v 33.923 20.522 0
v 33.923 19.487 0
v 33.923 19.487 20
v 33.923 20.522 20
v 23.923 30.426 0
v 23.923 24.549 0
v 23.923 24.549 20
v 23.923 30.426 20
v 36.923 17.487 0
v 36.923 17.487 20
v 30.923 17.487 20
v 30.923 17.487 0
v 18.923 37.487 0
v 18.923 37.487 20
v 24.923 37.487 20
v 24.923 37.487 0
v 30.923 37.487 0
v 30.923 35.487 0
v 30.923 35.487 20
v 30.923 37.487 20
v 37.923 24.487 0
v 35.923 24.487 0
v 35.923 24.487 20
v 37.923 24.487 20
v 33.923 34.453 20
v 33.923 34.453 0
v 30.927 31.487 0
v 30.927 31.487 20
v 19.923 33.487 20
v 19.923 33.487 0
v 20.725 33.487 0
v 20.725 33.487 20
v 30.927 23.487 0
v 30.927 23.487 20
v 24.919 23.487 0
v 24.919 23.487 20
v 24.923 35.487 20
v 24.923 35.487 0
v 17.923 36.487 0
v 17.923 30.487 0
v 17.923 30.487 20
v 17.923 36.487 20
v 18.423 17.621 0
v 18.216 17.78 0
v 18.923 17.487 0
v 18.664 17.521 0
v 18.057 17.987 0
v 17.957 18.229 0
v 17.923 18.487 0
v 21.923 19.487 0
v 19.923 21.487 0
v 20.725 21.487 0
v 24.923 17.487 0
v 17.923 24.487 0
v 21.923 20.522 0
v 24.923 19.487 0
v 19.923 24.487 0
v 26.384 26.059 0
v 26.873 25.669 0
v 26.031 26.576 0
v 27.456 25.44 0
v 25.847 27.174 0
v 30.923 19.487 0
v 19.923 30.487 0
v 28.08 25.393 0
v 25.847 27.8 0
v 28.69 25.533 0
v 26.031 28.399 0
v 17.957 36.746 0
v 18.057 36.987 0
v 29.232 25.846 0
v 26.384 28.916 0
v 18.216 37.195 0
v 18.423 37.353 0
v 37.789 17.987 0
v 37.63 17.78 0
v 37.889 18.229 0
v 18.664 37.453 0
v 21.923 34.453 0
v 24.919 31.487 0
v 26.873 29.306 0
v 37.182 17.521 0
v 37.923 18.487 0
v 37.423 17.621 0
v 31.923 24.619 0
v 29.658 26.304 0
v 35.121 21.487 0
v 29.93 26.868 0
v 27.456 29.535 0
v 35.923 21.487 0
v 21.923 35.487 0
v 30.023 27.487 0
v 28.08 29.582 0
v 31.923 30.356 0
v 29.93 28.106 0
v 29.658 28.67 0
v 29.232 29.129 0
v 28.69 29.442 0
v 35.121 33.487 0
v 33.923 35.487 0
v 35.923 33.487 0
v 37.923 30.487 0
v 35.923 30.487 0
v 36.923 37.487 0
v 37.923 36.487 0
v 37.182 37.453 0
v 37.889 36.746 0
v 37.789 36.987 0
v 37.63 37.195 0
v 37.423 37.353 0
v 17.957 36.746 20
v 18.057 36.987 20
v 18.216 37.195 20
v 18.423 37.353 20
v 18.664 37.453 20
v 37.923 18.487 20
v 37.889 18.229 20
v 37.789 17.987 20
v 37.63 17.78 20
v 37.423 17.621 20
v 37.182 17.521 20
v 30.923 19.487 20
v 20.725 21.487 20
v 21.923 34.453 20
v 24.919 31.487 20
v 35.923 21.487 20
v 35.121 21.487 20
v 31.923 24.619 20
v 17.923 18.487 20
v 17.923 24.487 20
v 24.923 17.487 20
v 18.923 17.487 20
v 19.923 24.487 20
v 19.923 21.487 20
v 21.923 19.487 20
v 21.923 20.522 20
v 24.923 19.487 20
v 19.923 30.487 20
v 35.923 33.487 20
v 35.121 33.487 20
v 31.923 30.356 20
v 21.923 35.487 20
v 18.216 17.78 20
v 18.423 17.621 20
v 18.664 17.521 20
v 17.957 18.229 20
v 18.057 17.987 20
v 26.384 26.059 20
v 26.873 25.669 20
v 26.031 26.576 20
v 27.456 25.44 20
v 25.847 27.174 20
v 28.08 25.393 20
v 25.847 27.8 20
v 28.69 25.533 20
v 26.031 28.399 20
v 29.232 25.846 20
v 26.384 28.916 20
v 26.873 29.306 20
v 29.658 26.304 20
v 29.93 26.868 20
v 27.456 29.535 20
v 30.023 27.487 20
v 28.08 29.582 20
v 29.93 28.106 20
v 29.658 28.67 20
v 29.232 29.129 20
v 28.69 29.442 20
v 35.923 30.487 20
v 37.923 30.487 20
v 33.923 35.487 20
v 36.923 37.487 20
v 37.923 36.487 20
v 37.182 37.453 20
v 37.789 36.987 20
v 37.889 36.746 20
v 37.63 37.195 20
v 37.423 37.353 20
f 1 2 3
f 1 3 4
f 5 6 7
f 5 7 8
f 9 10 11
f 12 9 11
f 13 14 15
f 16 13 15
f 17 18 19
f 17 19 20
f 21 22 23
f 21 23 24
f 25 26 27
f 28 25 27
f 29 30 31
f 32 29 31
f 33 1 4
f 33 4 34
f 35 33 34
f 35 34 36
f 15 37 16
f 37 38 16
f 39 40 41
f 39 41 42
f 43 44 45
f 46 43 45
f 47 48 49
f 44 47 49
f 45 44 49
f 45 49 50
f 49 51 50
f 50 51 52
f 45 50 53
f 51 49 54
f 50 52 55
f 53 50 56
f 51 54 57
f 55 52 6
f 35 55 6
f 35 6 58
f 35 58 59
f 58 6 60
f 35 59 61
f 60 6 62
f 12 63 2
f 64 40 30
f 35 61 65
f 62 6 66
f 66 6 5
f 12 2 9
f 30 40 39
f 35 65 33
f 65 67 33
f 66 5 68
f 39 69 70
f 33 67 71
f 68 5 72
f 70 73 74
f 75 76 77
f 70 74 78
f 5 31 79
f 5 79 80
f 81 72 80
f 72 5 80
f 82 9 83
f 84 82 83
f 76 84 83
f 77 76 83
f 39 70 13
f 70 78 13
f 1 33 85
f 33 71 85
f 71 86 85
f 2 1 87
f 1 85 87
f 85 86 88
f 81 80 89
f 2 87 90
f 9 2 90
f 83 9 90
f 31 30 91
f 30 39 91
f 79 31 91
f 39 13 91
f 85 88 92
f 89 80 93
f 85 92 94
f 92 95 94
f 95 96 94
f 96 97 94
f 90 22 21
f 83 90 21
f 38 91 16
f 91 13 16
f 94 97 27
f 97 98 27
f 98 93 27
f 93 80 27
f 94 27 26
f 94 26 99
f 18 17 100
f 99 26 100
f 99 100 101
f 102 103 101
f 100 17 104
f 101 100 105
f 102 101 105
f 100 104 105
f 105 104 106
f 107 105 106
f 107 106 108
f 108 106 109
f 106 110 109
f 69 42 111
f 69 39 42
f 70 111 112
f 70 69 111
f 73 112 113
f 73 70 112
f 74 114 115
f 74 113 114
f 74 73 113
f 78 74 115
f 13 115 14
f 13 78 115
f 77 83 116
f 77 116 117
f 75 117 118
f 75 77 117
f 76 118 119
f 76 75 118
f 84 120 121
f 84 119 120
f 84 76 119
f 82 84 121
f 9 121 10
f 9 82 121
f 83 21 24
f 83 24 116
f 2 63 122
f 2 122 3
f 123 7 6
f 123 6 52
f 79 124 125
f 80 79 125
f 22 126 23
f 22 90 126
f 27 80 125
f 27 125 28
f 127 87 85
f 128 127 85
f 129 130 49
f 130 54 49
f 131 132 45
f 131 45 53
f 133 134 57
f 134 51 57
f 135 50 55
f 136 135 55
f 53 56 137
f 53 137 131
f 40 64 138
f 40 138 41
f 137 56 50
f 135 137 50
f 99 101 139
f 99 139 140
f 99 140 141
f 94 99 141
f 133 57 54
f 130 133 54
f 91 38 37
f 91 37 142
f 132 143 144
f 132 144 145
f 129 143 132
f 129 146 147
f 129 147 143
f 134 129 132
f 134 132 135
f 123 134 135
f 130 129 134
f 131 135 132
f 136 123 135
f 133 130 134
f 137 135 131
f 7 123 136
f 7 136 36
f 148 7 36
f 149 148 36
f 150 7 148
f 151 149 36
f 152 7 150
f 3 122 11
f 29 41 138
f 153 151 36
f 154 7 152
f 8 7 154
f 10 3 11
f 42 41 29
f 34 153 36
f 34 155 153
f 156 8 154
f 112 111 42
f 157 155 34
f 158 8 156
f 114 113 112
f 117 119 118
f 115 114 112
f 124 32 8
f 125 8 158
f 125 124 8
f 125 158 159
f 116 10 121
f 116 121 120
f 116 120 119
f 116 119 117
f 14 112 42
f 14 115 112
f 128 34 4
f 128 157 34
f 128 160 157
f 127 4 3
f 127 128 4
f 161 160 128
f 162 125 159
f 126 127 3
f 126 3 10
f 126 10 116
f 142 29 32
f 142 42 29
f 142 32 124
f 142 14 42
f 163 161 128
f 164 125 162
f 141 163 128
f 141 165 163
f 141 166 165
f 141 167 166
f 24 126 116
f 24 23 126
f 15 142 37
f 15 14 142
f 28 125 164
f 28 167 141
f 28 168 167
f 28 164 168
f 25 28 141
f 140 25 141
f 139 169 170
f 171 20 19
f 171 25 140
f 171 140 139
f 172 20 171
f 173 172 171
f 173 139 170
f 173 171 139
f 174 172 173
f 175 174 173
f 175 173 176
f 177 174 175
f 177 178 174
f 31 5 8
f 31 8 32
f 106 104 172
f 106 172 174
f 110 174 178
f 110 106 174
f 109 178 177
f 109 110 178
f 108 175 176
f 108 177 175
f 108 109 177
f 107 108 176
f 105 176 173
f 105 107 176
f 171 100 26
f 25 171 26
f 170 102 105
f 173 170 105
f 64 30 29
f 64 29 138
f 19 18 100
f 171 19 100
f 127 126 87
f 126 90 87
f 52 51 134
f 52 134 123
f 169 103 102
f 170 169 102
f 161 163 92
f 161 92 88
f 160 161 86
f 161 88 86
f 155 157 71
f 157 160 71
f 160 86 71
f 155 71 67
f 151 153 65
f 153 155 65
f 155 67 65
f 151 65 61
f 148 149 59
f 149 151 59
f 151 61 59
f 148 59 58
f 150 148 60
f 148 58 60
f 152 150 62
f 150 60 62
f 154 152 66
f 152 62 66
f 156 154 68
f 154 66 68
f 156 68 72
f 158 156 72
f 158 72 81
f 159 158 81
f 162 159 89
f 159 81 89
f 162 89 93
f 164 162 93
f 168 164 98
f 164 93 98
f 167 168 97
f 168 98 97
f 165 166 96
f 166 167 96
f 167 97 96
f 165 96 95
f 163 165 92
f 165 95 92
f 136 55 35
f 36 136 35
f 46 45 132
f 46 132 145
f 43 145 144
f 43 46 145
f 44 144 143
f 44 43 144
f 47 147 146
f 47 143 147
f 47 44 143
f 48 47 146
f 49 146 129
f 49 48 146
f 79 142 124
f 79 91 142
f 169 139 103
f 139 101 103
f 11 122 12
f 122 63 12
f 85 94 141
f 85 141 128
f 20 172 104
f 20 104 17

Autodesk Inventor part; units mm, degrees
ref_plane "YZ Plane" through (0, 0, 0) normal (1, 0, 0) x (0, 1, 0)
ref_plane "XZ Plane" through (0, 0, 0) normal (0, 1, 0) x (-1, 0, 0)
ref_plane "XY Plane" through (0, 0, 0) normal (0, 0, 1) x (1, 0, 0)
sketch "Schizzo1" plane through (0, 0, 0) normal (0, 0, 1) x (1, 0, 0)
  arc A0 (36.9231, 17.4874) -> (37.9231, 18.4874) centre (36.9231, 18.4874) ccw
  line L0 (27.9231, 37.356) -> (27.9231, 17.6188) construction
  line L1 (36.9231, 17.4874) -> (30.9231, 17.4874)
  line L2 (30.9231, 19.4874) -> (33.9231, 19.4874)
  line L3 (30.9231, 19.4874) -> (30.9231, 17.4874)
  line L4 (33.9231, 19.4874) -> (33.9231, 20.5217)
  line L5 (35.9231, 21.4874) -> (35.1213, 21.4874)
  line L6 (33.9231, 20.5217) -> (30.9273, 23.4874)
  line L7 (31.958, 23.6188) -> (32.4267, 23.6188) construction
  line L8 (35.1213, 21.4874) -> (31.9231, 24.6188)
  line L9 (27.9231, 28.7445) -> (27.9203, 28.7473)
  line L10 (27.9231, 27.4874) -> (16.785, 27.4874) construction
  line L11 (35.9231, 21.4874) -> (35.9231, 24.4874)
  line L12 (35.9231, 24.4874) -> (37.9231, 24.4874)
  line L13 (37.9231, 24.4874) -> (37.9231, 18.4874)
  line L14 (0.5417, 54.5893) -> (0.5417, -0.7152) construction
  arc A1 (17.9231, 18.4874) -> (18.9231, 17.4874) centre (18.9231, 18.4874) ccw
  line L15 (18.9231, 17.4874) -> (24.9231, 17.4874)
  line L16 (24.9231, 19.4874) -> (21.9231, 19.4874)
  line L17 (24.9231, 19.4874) -> (24.9231, 17.4874)
  line L18 (21.9231, 19.4874) -> (21.9231, 20.5217)
  line L19 (19.9231, 21.4874) -> (20.725, 21.4874)
  line L20 (21.9231, 20.5217) -> (24.919, 23.4874)
  line L21 (23.958, 23.6188) -> (23.9231, 23.6188) construction
  line L22 (19.9231, 21.4874) -> (19.9231, 24.4874)
  line L23 (19.9231, 24.4874) -> (17.9231, 24.4874)
  line L24 (17.9231, 24.4874) -> (17.9231, 18.4874)
  line L25 (33.8225, 24.3529) -> (33.8225, 24.4874)
  arc A2 (37.9231, 36.4874) -> (36.9231, 37.4874) centre (36.9231, 36.4874) ccw
  line L26 (36.9231, 37.4874) -> (30.9231, 37.4874)
  line L27 (30.9231, 35.4874) -> (33.9231, 35.4874)
  line L28 (30.9231, 35.4874) -> (30.9231, 37.4874)
  line L29 (33.9231, 35.4874) -> (33.9231, 34.4531)
  line L30 (35.9231, 33.4874) -> (35.1213, 33.4874)
  line L31 (33.9231, 34.4531) -> (30.9273, 31.4874)
  line L32 (31.958, 31.356) -> (32.4267, 31.356) construction
  line L33 (35.1213, 33.4874) -> (31.9231, 30.356)
  line L34 (35.9231, 33.4874) -> (35.9231, 30.4874)
  line L35 (35.9231, 30.4874) -> (37.9231, 30.4874)
  line L36 (37.9231, 30.4874) -> (37.9231, 36.4874)
  arc A3 (18.9231, 37.4874) -> (17.9231, 36.4874) centre (18.9231, 36.4874) ccw
  line L37 (19.9231, 30.4874) -> (17.9231, 30.4874)
  line L38 (19.9231, 33.4874) -> (20.725, 33.4874)
  line L39 (19.9231, 33.4874) -> (19.9231, 30.4874)
  line L40 (21.9231, 34.4531) -> (24.919, 31.4874)
  line L41 (24.9231, 35.4874) -> (21.9231, 35.4874)
  line L42 (21.9231, 35.4874) -> (21.9231, 34.4531)
  line L43 (24.9231, 35.4874) -> (24.9231, 37.4874)
  line L44 (18.9231, 37.4874) -> (24.9231, 37.4874)
  line L45 (17.9231, 30.4874) -> (17.9231, 36.4874)
  line L46 (33.8225, 30.6219) -> (33.8225, 30.4874)
  line L47 (30.9273, 23.4874) -> (24.919, 23.4874)
  line L48 (23.9231, 24.549) -> (23.9231, 30.4259)
  line L49 (24.919, 31.4874) -> (30.9273, 31.4874)
  line L50 (31.9231, 30.356) -> (31.9231, 24.6188)
  line L51 (23.9231, 24.549) -> (20.725, 21.4874)
  line L52 (23.9231, 30.4259) -> (20.725, 33.4874)
  circle A4 centre (27.9231, 27.4874) radius 2.1
  point P0 (0, 0)
  point P1 (17.9231, 17.6188)
  point P2 (22.0237, 24.3529)
  point P3 (24.8821, 25.7341)
  point P4 (23.4196, 23.6188)
  point P5 (17.9231, 37.356)
  point P6 (22.0237, 30.6219)
  point P7 (24.8821, 29.2408)
  point P8 (27.958, 27.4874)
  dimension "d104" = 20
  dimension "d111" = 8
  dimension "d112" = 4.2
  dimension "d115" = 20
  dimension "d116" = 6
  dimension "d117" = 4
  dimension "d118" = 1
  dimension "d119" = 12
  dimension "d129" = 6
  dimension "d130" = 6
  dimension "d131" = 6
  dimension "d132" = 2
  dimension "d133" = 2
  dimension "d134" = 2
  dimension "d135" = 2
  dimension "d136" = 12
  dimension "d137" = 12
  dimension "d146" = 8
extrude "Estrusione1" add sketch "Schizzo1" along normal blind 20
properties part number "Aluminium profile 20x20 6mm slot"
